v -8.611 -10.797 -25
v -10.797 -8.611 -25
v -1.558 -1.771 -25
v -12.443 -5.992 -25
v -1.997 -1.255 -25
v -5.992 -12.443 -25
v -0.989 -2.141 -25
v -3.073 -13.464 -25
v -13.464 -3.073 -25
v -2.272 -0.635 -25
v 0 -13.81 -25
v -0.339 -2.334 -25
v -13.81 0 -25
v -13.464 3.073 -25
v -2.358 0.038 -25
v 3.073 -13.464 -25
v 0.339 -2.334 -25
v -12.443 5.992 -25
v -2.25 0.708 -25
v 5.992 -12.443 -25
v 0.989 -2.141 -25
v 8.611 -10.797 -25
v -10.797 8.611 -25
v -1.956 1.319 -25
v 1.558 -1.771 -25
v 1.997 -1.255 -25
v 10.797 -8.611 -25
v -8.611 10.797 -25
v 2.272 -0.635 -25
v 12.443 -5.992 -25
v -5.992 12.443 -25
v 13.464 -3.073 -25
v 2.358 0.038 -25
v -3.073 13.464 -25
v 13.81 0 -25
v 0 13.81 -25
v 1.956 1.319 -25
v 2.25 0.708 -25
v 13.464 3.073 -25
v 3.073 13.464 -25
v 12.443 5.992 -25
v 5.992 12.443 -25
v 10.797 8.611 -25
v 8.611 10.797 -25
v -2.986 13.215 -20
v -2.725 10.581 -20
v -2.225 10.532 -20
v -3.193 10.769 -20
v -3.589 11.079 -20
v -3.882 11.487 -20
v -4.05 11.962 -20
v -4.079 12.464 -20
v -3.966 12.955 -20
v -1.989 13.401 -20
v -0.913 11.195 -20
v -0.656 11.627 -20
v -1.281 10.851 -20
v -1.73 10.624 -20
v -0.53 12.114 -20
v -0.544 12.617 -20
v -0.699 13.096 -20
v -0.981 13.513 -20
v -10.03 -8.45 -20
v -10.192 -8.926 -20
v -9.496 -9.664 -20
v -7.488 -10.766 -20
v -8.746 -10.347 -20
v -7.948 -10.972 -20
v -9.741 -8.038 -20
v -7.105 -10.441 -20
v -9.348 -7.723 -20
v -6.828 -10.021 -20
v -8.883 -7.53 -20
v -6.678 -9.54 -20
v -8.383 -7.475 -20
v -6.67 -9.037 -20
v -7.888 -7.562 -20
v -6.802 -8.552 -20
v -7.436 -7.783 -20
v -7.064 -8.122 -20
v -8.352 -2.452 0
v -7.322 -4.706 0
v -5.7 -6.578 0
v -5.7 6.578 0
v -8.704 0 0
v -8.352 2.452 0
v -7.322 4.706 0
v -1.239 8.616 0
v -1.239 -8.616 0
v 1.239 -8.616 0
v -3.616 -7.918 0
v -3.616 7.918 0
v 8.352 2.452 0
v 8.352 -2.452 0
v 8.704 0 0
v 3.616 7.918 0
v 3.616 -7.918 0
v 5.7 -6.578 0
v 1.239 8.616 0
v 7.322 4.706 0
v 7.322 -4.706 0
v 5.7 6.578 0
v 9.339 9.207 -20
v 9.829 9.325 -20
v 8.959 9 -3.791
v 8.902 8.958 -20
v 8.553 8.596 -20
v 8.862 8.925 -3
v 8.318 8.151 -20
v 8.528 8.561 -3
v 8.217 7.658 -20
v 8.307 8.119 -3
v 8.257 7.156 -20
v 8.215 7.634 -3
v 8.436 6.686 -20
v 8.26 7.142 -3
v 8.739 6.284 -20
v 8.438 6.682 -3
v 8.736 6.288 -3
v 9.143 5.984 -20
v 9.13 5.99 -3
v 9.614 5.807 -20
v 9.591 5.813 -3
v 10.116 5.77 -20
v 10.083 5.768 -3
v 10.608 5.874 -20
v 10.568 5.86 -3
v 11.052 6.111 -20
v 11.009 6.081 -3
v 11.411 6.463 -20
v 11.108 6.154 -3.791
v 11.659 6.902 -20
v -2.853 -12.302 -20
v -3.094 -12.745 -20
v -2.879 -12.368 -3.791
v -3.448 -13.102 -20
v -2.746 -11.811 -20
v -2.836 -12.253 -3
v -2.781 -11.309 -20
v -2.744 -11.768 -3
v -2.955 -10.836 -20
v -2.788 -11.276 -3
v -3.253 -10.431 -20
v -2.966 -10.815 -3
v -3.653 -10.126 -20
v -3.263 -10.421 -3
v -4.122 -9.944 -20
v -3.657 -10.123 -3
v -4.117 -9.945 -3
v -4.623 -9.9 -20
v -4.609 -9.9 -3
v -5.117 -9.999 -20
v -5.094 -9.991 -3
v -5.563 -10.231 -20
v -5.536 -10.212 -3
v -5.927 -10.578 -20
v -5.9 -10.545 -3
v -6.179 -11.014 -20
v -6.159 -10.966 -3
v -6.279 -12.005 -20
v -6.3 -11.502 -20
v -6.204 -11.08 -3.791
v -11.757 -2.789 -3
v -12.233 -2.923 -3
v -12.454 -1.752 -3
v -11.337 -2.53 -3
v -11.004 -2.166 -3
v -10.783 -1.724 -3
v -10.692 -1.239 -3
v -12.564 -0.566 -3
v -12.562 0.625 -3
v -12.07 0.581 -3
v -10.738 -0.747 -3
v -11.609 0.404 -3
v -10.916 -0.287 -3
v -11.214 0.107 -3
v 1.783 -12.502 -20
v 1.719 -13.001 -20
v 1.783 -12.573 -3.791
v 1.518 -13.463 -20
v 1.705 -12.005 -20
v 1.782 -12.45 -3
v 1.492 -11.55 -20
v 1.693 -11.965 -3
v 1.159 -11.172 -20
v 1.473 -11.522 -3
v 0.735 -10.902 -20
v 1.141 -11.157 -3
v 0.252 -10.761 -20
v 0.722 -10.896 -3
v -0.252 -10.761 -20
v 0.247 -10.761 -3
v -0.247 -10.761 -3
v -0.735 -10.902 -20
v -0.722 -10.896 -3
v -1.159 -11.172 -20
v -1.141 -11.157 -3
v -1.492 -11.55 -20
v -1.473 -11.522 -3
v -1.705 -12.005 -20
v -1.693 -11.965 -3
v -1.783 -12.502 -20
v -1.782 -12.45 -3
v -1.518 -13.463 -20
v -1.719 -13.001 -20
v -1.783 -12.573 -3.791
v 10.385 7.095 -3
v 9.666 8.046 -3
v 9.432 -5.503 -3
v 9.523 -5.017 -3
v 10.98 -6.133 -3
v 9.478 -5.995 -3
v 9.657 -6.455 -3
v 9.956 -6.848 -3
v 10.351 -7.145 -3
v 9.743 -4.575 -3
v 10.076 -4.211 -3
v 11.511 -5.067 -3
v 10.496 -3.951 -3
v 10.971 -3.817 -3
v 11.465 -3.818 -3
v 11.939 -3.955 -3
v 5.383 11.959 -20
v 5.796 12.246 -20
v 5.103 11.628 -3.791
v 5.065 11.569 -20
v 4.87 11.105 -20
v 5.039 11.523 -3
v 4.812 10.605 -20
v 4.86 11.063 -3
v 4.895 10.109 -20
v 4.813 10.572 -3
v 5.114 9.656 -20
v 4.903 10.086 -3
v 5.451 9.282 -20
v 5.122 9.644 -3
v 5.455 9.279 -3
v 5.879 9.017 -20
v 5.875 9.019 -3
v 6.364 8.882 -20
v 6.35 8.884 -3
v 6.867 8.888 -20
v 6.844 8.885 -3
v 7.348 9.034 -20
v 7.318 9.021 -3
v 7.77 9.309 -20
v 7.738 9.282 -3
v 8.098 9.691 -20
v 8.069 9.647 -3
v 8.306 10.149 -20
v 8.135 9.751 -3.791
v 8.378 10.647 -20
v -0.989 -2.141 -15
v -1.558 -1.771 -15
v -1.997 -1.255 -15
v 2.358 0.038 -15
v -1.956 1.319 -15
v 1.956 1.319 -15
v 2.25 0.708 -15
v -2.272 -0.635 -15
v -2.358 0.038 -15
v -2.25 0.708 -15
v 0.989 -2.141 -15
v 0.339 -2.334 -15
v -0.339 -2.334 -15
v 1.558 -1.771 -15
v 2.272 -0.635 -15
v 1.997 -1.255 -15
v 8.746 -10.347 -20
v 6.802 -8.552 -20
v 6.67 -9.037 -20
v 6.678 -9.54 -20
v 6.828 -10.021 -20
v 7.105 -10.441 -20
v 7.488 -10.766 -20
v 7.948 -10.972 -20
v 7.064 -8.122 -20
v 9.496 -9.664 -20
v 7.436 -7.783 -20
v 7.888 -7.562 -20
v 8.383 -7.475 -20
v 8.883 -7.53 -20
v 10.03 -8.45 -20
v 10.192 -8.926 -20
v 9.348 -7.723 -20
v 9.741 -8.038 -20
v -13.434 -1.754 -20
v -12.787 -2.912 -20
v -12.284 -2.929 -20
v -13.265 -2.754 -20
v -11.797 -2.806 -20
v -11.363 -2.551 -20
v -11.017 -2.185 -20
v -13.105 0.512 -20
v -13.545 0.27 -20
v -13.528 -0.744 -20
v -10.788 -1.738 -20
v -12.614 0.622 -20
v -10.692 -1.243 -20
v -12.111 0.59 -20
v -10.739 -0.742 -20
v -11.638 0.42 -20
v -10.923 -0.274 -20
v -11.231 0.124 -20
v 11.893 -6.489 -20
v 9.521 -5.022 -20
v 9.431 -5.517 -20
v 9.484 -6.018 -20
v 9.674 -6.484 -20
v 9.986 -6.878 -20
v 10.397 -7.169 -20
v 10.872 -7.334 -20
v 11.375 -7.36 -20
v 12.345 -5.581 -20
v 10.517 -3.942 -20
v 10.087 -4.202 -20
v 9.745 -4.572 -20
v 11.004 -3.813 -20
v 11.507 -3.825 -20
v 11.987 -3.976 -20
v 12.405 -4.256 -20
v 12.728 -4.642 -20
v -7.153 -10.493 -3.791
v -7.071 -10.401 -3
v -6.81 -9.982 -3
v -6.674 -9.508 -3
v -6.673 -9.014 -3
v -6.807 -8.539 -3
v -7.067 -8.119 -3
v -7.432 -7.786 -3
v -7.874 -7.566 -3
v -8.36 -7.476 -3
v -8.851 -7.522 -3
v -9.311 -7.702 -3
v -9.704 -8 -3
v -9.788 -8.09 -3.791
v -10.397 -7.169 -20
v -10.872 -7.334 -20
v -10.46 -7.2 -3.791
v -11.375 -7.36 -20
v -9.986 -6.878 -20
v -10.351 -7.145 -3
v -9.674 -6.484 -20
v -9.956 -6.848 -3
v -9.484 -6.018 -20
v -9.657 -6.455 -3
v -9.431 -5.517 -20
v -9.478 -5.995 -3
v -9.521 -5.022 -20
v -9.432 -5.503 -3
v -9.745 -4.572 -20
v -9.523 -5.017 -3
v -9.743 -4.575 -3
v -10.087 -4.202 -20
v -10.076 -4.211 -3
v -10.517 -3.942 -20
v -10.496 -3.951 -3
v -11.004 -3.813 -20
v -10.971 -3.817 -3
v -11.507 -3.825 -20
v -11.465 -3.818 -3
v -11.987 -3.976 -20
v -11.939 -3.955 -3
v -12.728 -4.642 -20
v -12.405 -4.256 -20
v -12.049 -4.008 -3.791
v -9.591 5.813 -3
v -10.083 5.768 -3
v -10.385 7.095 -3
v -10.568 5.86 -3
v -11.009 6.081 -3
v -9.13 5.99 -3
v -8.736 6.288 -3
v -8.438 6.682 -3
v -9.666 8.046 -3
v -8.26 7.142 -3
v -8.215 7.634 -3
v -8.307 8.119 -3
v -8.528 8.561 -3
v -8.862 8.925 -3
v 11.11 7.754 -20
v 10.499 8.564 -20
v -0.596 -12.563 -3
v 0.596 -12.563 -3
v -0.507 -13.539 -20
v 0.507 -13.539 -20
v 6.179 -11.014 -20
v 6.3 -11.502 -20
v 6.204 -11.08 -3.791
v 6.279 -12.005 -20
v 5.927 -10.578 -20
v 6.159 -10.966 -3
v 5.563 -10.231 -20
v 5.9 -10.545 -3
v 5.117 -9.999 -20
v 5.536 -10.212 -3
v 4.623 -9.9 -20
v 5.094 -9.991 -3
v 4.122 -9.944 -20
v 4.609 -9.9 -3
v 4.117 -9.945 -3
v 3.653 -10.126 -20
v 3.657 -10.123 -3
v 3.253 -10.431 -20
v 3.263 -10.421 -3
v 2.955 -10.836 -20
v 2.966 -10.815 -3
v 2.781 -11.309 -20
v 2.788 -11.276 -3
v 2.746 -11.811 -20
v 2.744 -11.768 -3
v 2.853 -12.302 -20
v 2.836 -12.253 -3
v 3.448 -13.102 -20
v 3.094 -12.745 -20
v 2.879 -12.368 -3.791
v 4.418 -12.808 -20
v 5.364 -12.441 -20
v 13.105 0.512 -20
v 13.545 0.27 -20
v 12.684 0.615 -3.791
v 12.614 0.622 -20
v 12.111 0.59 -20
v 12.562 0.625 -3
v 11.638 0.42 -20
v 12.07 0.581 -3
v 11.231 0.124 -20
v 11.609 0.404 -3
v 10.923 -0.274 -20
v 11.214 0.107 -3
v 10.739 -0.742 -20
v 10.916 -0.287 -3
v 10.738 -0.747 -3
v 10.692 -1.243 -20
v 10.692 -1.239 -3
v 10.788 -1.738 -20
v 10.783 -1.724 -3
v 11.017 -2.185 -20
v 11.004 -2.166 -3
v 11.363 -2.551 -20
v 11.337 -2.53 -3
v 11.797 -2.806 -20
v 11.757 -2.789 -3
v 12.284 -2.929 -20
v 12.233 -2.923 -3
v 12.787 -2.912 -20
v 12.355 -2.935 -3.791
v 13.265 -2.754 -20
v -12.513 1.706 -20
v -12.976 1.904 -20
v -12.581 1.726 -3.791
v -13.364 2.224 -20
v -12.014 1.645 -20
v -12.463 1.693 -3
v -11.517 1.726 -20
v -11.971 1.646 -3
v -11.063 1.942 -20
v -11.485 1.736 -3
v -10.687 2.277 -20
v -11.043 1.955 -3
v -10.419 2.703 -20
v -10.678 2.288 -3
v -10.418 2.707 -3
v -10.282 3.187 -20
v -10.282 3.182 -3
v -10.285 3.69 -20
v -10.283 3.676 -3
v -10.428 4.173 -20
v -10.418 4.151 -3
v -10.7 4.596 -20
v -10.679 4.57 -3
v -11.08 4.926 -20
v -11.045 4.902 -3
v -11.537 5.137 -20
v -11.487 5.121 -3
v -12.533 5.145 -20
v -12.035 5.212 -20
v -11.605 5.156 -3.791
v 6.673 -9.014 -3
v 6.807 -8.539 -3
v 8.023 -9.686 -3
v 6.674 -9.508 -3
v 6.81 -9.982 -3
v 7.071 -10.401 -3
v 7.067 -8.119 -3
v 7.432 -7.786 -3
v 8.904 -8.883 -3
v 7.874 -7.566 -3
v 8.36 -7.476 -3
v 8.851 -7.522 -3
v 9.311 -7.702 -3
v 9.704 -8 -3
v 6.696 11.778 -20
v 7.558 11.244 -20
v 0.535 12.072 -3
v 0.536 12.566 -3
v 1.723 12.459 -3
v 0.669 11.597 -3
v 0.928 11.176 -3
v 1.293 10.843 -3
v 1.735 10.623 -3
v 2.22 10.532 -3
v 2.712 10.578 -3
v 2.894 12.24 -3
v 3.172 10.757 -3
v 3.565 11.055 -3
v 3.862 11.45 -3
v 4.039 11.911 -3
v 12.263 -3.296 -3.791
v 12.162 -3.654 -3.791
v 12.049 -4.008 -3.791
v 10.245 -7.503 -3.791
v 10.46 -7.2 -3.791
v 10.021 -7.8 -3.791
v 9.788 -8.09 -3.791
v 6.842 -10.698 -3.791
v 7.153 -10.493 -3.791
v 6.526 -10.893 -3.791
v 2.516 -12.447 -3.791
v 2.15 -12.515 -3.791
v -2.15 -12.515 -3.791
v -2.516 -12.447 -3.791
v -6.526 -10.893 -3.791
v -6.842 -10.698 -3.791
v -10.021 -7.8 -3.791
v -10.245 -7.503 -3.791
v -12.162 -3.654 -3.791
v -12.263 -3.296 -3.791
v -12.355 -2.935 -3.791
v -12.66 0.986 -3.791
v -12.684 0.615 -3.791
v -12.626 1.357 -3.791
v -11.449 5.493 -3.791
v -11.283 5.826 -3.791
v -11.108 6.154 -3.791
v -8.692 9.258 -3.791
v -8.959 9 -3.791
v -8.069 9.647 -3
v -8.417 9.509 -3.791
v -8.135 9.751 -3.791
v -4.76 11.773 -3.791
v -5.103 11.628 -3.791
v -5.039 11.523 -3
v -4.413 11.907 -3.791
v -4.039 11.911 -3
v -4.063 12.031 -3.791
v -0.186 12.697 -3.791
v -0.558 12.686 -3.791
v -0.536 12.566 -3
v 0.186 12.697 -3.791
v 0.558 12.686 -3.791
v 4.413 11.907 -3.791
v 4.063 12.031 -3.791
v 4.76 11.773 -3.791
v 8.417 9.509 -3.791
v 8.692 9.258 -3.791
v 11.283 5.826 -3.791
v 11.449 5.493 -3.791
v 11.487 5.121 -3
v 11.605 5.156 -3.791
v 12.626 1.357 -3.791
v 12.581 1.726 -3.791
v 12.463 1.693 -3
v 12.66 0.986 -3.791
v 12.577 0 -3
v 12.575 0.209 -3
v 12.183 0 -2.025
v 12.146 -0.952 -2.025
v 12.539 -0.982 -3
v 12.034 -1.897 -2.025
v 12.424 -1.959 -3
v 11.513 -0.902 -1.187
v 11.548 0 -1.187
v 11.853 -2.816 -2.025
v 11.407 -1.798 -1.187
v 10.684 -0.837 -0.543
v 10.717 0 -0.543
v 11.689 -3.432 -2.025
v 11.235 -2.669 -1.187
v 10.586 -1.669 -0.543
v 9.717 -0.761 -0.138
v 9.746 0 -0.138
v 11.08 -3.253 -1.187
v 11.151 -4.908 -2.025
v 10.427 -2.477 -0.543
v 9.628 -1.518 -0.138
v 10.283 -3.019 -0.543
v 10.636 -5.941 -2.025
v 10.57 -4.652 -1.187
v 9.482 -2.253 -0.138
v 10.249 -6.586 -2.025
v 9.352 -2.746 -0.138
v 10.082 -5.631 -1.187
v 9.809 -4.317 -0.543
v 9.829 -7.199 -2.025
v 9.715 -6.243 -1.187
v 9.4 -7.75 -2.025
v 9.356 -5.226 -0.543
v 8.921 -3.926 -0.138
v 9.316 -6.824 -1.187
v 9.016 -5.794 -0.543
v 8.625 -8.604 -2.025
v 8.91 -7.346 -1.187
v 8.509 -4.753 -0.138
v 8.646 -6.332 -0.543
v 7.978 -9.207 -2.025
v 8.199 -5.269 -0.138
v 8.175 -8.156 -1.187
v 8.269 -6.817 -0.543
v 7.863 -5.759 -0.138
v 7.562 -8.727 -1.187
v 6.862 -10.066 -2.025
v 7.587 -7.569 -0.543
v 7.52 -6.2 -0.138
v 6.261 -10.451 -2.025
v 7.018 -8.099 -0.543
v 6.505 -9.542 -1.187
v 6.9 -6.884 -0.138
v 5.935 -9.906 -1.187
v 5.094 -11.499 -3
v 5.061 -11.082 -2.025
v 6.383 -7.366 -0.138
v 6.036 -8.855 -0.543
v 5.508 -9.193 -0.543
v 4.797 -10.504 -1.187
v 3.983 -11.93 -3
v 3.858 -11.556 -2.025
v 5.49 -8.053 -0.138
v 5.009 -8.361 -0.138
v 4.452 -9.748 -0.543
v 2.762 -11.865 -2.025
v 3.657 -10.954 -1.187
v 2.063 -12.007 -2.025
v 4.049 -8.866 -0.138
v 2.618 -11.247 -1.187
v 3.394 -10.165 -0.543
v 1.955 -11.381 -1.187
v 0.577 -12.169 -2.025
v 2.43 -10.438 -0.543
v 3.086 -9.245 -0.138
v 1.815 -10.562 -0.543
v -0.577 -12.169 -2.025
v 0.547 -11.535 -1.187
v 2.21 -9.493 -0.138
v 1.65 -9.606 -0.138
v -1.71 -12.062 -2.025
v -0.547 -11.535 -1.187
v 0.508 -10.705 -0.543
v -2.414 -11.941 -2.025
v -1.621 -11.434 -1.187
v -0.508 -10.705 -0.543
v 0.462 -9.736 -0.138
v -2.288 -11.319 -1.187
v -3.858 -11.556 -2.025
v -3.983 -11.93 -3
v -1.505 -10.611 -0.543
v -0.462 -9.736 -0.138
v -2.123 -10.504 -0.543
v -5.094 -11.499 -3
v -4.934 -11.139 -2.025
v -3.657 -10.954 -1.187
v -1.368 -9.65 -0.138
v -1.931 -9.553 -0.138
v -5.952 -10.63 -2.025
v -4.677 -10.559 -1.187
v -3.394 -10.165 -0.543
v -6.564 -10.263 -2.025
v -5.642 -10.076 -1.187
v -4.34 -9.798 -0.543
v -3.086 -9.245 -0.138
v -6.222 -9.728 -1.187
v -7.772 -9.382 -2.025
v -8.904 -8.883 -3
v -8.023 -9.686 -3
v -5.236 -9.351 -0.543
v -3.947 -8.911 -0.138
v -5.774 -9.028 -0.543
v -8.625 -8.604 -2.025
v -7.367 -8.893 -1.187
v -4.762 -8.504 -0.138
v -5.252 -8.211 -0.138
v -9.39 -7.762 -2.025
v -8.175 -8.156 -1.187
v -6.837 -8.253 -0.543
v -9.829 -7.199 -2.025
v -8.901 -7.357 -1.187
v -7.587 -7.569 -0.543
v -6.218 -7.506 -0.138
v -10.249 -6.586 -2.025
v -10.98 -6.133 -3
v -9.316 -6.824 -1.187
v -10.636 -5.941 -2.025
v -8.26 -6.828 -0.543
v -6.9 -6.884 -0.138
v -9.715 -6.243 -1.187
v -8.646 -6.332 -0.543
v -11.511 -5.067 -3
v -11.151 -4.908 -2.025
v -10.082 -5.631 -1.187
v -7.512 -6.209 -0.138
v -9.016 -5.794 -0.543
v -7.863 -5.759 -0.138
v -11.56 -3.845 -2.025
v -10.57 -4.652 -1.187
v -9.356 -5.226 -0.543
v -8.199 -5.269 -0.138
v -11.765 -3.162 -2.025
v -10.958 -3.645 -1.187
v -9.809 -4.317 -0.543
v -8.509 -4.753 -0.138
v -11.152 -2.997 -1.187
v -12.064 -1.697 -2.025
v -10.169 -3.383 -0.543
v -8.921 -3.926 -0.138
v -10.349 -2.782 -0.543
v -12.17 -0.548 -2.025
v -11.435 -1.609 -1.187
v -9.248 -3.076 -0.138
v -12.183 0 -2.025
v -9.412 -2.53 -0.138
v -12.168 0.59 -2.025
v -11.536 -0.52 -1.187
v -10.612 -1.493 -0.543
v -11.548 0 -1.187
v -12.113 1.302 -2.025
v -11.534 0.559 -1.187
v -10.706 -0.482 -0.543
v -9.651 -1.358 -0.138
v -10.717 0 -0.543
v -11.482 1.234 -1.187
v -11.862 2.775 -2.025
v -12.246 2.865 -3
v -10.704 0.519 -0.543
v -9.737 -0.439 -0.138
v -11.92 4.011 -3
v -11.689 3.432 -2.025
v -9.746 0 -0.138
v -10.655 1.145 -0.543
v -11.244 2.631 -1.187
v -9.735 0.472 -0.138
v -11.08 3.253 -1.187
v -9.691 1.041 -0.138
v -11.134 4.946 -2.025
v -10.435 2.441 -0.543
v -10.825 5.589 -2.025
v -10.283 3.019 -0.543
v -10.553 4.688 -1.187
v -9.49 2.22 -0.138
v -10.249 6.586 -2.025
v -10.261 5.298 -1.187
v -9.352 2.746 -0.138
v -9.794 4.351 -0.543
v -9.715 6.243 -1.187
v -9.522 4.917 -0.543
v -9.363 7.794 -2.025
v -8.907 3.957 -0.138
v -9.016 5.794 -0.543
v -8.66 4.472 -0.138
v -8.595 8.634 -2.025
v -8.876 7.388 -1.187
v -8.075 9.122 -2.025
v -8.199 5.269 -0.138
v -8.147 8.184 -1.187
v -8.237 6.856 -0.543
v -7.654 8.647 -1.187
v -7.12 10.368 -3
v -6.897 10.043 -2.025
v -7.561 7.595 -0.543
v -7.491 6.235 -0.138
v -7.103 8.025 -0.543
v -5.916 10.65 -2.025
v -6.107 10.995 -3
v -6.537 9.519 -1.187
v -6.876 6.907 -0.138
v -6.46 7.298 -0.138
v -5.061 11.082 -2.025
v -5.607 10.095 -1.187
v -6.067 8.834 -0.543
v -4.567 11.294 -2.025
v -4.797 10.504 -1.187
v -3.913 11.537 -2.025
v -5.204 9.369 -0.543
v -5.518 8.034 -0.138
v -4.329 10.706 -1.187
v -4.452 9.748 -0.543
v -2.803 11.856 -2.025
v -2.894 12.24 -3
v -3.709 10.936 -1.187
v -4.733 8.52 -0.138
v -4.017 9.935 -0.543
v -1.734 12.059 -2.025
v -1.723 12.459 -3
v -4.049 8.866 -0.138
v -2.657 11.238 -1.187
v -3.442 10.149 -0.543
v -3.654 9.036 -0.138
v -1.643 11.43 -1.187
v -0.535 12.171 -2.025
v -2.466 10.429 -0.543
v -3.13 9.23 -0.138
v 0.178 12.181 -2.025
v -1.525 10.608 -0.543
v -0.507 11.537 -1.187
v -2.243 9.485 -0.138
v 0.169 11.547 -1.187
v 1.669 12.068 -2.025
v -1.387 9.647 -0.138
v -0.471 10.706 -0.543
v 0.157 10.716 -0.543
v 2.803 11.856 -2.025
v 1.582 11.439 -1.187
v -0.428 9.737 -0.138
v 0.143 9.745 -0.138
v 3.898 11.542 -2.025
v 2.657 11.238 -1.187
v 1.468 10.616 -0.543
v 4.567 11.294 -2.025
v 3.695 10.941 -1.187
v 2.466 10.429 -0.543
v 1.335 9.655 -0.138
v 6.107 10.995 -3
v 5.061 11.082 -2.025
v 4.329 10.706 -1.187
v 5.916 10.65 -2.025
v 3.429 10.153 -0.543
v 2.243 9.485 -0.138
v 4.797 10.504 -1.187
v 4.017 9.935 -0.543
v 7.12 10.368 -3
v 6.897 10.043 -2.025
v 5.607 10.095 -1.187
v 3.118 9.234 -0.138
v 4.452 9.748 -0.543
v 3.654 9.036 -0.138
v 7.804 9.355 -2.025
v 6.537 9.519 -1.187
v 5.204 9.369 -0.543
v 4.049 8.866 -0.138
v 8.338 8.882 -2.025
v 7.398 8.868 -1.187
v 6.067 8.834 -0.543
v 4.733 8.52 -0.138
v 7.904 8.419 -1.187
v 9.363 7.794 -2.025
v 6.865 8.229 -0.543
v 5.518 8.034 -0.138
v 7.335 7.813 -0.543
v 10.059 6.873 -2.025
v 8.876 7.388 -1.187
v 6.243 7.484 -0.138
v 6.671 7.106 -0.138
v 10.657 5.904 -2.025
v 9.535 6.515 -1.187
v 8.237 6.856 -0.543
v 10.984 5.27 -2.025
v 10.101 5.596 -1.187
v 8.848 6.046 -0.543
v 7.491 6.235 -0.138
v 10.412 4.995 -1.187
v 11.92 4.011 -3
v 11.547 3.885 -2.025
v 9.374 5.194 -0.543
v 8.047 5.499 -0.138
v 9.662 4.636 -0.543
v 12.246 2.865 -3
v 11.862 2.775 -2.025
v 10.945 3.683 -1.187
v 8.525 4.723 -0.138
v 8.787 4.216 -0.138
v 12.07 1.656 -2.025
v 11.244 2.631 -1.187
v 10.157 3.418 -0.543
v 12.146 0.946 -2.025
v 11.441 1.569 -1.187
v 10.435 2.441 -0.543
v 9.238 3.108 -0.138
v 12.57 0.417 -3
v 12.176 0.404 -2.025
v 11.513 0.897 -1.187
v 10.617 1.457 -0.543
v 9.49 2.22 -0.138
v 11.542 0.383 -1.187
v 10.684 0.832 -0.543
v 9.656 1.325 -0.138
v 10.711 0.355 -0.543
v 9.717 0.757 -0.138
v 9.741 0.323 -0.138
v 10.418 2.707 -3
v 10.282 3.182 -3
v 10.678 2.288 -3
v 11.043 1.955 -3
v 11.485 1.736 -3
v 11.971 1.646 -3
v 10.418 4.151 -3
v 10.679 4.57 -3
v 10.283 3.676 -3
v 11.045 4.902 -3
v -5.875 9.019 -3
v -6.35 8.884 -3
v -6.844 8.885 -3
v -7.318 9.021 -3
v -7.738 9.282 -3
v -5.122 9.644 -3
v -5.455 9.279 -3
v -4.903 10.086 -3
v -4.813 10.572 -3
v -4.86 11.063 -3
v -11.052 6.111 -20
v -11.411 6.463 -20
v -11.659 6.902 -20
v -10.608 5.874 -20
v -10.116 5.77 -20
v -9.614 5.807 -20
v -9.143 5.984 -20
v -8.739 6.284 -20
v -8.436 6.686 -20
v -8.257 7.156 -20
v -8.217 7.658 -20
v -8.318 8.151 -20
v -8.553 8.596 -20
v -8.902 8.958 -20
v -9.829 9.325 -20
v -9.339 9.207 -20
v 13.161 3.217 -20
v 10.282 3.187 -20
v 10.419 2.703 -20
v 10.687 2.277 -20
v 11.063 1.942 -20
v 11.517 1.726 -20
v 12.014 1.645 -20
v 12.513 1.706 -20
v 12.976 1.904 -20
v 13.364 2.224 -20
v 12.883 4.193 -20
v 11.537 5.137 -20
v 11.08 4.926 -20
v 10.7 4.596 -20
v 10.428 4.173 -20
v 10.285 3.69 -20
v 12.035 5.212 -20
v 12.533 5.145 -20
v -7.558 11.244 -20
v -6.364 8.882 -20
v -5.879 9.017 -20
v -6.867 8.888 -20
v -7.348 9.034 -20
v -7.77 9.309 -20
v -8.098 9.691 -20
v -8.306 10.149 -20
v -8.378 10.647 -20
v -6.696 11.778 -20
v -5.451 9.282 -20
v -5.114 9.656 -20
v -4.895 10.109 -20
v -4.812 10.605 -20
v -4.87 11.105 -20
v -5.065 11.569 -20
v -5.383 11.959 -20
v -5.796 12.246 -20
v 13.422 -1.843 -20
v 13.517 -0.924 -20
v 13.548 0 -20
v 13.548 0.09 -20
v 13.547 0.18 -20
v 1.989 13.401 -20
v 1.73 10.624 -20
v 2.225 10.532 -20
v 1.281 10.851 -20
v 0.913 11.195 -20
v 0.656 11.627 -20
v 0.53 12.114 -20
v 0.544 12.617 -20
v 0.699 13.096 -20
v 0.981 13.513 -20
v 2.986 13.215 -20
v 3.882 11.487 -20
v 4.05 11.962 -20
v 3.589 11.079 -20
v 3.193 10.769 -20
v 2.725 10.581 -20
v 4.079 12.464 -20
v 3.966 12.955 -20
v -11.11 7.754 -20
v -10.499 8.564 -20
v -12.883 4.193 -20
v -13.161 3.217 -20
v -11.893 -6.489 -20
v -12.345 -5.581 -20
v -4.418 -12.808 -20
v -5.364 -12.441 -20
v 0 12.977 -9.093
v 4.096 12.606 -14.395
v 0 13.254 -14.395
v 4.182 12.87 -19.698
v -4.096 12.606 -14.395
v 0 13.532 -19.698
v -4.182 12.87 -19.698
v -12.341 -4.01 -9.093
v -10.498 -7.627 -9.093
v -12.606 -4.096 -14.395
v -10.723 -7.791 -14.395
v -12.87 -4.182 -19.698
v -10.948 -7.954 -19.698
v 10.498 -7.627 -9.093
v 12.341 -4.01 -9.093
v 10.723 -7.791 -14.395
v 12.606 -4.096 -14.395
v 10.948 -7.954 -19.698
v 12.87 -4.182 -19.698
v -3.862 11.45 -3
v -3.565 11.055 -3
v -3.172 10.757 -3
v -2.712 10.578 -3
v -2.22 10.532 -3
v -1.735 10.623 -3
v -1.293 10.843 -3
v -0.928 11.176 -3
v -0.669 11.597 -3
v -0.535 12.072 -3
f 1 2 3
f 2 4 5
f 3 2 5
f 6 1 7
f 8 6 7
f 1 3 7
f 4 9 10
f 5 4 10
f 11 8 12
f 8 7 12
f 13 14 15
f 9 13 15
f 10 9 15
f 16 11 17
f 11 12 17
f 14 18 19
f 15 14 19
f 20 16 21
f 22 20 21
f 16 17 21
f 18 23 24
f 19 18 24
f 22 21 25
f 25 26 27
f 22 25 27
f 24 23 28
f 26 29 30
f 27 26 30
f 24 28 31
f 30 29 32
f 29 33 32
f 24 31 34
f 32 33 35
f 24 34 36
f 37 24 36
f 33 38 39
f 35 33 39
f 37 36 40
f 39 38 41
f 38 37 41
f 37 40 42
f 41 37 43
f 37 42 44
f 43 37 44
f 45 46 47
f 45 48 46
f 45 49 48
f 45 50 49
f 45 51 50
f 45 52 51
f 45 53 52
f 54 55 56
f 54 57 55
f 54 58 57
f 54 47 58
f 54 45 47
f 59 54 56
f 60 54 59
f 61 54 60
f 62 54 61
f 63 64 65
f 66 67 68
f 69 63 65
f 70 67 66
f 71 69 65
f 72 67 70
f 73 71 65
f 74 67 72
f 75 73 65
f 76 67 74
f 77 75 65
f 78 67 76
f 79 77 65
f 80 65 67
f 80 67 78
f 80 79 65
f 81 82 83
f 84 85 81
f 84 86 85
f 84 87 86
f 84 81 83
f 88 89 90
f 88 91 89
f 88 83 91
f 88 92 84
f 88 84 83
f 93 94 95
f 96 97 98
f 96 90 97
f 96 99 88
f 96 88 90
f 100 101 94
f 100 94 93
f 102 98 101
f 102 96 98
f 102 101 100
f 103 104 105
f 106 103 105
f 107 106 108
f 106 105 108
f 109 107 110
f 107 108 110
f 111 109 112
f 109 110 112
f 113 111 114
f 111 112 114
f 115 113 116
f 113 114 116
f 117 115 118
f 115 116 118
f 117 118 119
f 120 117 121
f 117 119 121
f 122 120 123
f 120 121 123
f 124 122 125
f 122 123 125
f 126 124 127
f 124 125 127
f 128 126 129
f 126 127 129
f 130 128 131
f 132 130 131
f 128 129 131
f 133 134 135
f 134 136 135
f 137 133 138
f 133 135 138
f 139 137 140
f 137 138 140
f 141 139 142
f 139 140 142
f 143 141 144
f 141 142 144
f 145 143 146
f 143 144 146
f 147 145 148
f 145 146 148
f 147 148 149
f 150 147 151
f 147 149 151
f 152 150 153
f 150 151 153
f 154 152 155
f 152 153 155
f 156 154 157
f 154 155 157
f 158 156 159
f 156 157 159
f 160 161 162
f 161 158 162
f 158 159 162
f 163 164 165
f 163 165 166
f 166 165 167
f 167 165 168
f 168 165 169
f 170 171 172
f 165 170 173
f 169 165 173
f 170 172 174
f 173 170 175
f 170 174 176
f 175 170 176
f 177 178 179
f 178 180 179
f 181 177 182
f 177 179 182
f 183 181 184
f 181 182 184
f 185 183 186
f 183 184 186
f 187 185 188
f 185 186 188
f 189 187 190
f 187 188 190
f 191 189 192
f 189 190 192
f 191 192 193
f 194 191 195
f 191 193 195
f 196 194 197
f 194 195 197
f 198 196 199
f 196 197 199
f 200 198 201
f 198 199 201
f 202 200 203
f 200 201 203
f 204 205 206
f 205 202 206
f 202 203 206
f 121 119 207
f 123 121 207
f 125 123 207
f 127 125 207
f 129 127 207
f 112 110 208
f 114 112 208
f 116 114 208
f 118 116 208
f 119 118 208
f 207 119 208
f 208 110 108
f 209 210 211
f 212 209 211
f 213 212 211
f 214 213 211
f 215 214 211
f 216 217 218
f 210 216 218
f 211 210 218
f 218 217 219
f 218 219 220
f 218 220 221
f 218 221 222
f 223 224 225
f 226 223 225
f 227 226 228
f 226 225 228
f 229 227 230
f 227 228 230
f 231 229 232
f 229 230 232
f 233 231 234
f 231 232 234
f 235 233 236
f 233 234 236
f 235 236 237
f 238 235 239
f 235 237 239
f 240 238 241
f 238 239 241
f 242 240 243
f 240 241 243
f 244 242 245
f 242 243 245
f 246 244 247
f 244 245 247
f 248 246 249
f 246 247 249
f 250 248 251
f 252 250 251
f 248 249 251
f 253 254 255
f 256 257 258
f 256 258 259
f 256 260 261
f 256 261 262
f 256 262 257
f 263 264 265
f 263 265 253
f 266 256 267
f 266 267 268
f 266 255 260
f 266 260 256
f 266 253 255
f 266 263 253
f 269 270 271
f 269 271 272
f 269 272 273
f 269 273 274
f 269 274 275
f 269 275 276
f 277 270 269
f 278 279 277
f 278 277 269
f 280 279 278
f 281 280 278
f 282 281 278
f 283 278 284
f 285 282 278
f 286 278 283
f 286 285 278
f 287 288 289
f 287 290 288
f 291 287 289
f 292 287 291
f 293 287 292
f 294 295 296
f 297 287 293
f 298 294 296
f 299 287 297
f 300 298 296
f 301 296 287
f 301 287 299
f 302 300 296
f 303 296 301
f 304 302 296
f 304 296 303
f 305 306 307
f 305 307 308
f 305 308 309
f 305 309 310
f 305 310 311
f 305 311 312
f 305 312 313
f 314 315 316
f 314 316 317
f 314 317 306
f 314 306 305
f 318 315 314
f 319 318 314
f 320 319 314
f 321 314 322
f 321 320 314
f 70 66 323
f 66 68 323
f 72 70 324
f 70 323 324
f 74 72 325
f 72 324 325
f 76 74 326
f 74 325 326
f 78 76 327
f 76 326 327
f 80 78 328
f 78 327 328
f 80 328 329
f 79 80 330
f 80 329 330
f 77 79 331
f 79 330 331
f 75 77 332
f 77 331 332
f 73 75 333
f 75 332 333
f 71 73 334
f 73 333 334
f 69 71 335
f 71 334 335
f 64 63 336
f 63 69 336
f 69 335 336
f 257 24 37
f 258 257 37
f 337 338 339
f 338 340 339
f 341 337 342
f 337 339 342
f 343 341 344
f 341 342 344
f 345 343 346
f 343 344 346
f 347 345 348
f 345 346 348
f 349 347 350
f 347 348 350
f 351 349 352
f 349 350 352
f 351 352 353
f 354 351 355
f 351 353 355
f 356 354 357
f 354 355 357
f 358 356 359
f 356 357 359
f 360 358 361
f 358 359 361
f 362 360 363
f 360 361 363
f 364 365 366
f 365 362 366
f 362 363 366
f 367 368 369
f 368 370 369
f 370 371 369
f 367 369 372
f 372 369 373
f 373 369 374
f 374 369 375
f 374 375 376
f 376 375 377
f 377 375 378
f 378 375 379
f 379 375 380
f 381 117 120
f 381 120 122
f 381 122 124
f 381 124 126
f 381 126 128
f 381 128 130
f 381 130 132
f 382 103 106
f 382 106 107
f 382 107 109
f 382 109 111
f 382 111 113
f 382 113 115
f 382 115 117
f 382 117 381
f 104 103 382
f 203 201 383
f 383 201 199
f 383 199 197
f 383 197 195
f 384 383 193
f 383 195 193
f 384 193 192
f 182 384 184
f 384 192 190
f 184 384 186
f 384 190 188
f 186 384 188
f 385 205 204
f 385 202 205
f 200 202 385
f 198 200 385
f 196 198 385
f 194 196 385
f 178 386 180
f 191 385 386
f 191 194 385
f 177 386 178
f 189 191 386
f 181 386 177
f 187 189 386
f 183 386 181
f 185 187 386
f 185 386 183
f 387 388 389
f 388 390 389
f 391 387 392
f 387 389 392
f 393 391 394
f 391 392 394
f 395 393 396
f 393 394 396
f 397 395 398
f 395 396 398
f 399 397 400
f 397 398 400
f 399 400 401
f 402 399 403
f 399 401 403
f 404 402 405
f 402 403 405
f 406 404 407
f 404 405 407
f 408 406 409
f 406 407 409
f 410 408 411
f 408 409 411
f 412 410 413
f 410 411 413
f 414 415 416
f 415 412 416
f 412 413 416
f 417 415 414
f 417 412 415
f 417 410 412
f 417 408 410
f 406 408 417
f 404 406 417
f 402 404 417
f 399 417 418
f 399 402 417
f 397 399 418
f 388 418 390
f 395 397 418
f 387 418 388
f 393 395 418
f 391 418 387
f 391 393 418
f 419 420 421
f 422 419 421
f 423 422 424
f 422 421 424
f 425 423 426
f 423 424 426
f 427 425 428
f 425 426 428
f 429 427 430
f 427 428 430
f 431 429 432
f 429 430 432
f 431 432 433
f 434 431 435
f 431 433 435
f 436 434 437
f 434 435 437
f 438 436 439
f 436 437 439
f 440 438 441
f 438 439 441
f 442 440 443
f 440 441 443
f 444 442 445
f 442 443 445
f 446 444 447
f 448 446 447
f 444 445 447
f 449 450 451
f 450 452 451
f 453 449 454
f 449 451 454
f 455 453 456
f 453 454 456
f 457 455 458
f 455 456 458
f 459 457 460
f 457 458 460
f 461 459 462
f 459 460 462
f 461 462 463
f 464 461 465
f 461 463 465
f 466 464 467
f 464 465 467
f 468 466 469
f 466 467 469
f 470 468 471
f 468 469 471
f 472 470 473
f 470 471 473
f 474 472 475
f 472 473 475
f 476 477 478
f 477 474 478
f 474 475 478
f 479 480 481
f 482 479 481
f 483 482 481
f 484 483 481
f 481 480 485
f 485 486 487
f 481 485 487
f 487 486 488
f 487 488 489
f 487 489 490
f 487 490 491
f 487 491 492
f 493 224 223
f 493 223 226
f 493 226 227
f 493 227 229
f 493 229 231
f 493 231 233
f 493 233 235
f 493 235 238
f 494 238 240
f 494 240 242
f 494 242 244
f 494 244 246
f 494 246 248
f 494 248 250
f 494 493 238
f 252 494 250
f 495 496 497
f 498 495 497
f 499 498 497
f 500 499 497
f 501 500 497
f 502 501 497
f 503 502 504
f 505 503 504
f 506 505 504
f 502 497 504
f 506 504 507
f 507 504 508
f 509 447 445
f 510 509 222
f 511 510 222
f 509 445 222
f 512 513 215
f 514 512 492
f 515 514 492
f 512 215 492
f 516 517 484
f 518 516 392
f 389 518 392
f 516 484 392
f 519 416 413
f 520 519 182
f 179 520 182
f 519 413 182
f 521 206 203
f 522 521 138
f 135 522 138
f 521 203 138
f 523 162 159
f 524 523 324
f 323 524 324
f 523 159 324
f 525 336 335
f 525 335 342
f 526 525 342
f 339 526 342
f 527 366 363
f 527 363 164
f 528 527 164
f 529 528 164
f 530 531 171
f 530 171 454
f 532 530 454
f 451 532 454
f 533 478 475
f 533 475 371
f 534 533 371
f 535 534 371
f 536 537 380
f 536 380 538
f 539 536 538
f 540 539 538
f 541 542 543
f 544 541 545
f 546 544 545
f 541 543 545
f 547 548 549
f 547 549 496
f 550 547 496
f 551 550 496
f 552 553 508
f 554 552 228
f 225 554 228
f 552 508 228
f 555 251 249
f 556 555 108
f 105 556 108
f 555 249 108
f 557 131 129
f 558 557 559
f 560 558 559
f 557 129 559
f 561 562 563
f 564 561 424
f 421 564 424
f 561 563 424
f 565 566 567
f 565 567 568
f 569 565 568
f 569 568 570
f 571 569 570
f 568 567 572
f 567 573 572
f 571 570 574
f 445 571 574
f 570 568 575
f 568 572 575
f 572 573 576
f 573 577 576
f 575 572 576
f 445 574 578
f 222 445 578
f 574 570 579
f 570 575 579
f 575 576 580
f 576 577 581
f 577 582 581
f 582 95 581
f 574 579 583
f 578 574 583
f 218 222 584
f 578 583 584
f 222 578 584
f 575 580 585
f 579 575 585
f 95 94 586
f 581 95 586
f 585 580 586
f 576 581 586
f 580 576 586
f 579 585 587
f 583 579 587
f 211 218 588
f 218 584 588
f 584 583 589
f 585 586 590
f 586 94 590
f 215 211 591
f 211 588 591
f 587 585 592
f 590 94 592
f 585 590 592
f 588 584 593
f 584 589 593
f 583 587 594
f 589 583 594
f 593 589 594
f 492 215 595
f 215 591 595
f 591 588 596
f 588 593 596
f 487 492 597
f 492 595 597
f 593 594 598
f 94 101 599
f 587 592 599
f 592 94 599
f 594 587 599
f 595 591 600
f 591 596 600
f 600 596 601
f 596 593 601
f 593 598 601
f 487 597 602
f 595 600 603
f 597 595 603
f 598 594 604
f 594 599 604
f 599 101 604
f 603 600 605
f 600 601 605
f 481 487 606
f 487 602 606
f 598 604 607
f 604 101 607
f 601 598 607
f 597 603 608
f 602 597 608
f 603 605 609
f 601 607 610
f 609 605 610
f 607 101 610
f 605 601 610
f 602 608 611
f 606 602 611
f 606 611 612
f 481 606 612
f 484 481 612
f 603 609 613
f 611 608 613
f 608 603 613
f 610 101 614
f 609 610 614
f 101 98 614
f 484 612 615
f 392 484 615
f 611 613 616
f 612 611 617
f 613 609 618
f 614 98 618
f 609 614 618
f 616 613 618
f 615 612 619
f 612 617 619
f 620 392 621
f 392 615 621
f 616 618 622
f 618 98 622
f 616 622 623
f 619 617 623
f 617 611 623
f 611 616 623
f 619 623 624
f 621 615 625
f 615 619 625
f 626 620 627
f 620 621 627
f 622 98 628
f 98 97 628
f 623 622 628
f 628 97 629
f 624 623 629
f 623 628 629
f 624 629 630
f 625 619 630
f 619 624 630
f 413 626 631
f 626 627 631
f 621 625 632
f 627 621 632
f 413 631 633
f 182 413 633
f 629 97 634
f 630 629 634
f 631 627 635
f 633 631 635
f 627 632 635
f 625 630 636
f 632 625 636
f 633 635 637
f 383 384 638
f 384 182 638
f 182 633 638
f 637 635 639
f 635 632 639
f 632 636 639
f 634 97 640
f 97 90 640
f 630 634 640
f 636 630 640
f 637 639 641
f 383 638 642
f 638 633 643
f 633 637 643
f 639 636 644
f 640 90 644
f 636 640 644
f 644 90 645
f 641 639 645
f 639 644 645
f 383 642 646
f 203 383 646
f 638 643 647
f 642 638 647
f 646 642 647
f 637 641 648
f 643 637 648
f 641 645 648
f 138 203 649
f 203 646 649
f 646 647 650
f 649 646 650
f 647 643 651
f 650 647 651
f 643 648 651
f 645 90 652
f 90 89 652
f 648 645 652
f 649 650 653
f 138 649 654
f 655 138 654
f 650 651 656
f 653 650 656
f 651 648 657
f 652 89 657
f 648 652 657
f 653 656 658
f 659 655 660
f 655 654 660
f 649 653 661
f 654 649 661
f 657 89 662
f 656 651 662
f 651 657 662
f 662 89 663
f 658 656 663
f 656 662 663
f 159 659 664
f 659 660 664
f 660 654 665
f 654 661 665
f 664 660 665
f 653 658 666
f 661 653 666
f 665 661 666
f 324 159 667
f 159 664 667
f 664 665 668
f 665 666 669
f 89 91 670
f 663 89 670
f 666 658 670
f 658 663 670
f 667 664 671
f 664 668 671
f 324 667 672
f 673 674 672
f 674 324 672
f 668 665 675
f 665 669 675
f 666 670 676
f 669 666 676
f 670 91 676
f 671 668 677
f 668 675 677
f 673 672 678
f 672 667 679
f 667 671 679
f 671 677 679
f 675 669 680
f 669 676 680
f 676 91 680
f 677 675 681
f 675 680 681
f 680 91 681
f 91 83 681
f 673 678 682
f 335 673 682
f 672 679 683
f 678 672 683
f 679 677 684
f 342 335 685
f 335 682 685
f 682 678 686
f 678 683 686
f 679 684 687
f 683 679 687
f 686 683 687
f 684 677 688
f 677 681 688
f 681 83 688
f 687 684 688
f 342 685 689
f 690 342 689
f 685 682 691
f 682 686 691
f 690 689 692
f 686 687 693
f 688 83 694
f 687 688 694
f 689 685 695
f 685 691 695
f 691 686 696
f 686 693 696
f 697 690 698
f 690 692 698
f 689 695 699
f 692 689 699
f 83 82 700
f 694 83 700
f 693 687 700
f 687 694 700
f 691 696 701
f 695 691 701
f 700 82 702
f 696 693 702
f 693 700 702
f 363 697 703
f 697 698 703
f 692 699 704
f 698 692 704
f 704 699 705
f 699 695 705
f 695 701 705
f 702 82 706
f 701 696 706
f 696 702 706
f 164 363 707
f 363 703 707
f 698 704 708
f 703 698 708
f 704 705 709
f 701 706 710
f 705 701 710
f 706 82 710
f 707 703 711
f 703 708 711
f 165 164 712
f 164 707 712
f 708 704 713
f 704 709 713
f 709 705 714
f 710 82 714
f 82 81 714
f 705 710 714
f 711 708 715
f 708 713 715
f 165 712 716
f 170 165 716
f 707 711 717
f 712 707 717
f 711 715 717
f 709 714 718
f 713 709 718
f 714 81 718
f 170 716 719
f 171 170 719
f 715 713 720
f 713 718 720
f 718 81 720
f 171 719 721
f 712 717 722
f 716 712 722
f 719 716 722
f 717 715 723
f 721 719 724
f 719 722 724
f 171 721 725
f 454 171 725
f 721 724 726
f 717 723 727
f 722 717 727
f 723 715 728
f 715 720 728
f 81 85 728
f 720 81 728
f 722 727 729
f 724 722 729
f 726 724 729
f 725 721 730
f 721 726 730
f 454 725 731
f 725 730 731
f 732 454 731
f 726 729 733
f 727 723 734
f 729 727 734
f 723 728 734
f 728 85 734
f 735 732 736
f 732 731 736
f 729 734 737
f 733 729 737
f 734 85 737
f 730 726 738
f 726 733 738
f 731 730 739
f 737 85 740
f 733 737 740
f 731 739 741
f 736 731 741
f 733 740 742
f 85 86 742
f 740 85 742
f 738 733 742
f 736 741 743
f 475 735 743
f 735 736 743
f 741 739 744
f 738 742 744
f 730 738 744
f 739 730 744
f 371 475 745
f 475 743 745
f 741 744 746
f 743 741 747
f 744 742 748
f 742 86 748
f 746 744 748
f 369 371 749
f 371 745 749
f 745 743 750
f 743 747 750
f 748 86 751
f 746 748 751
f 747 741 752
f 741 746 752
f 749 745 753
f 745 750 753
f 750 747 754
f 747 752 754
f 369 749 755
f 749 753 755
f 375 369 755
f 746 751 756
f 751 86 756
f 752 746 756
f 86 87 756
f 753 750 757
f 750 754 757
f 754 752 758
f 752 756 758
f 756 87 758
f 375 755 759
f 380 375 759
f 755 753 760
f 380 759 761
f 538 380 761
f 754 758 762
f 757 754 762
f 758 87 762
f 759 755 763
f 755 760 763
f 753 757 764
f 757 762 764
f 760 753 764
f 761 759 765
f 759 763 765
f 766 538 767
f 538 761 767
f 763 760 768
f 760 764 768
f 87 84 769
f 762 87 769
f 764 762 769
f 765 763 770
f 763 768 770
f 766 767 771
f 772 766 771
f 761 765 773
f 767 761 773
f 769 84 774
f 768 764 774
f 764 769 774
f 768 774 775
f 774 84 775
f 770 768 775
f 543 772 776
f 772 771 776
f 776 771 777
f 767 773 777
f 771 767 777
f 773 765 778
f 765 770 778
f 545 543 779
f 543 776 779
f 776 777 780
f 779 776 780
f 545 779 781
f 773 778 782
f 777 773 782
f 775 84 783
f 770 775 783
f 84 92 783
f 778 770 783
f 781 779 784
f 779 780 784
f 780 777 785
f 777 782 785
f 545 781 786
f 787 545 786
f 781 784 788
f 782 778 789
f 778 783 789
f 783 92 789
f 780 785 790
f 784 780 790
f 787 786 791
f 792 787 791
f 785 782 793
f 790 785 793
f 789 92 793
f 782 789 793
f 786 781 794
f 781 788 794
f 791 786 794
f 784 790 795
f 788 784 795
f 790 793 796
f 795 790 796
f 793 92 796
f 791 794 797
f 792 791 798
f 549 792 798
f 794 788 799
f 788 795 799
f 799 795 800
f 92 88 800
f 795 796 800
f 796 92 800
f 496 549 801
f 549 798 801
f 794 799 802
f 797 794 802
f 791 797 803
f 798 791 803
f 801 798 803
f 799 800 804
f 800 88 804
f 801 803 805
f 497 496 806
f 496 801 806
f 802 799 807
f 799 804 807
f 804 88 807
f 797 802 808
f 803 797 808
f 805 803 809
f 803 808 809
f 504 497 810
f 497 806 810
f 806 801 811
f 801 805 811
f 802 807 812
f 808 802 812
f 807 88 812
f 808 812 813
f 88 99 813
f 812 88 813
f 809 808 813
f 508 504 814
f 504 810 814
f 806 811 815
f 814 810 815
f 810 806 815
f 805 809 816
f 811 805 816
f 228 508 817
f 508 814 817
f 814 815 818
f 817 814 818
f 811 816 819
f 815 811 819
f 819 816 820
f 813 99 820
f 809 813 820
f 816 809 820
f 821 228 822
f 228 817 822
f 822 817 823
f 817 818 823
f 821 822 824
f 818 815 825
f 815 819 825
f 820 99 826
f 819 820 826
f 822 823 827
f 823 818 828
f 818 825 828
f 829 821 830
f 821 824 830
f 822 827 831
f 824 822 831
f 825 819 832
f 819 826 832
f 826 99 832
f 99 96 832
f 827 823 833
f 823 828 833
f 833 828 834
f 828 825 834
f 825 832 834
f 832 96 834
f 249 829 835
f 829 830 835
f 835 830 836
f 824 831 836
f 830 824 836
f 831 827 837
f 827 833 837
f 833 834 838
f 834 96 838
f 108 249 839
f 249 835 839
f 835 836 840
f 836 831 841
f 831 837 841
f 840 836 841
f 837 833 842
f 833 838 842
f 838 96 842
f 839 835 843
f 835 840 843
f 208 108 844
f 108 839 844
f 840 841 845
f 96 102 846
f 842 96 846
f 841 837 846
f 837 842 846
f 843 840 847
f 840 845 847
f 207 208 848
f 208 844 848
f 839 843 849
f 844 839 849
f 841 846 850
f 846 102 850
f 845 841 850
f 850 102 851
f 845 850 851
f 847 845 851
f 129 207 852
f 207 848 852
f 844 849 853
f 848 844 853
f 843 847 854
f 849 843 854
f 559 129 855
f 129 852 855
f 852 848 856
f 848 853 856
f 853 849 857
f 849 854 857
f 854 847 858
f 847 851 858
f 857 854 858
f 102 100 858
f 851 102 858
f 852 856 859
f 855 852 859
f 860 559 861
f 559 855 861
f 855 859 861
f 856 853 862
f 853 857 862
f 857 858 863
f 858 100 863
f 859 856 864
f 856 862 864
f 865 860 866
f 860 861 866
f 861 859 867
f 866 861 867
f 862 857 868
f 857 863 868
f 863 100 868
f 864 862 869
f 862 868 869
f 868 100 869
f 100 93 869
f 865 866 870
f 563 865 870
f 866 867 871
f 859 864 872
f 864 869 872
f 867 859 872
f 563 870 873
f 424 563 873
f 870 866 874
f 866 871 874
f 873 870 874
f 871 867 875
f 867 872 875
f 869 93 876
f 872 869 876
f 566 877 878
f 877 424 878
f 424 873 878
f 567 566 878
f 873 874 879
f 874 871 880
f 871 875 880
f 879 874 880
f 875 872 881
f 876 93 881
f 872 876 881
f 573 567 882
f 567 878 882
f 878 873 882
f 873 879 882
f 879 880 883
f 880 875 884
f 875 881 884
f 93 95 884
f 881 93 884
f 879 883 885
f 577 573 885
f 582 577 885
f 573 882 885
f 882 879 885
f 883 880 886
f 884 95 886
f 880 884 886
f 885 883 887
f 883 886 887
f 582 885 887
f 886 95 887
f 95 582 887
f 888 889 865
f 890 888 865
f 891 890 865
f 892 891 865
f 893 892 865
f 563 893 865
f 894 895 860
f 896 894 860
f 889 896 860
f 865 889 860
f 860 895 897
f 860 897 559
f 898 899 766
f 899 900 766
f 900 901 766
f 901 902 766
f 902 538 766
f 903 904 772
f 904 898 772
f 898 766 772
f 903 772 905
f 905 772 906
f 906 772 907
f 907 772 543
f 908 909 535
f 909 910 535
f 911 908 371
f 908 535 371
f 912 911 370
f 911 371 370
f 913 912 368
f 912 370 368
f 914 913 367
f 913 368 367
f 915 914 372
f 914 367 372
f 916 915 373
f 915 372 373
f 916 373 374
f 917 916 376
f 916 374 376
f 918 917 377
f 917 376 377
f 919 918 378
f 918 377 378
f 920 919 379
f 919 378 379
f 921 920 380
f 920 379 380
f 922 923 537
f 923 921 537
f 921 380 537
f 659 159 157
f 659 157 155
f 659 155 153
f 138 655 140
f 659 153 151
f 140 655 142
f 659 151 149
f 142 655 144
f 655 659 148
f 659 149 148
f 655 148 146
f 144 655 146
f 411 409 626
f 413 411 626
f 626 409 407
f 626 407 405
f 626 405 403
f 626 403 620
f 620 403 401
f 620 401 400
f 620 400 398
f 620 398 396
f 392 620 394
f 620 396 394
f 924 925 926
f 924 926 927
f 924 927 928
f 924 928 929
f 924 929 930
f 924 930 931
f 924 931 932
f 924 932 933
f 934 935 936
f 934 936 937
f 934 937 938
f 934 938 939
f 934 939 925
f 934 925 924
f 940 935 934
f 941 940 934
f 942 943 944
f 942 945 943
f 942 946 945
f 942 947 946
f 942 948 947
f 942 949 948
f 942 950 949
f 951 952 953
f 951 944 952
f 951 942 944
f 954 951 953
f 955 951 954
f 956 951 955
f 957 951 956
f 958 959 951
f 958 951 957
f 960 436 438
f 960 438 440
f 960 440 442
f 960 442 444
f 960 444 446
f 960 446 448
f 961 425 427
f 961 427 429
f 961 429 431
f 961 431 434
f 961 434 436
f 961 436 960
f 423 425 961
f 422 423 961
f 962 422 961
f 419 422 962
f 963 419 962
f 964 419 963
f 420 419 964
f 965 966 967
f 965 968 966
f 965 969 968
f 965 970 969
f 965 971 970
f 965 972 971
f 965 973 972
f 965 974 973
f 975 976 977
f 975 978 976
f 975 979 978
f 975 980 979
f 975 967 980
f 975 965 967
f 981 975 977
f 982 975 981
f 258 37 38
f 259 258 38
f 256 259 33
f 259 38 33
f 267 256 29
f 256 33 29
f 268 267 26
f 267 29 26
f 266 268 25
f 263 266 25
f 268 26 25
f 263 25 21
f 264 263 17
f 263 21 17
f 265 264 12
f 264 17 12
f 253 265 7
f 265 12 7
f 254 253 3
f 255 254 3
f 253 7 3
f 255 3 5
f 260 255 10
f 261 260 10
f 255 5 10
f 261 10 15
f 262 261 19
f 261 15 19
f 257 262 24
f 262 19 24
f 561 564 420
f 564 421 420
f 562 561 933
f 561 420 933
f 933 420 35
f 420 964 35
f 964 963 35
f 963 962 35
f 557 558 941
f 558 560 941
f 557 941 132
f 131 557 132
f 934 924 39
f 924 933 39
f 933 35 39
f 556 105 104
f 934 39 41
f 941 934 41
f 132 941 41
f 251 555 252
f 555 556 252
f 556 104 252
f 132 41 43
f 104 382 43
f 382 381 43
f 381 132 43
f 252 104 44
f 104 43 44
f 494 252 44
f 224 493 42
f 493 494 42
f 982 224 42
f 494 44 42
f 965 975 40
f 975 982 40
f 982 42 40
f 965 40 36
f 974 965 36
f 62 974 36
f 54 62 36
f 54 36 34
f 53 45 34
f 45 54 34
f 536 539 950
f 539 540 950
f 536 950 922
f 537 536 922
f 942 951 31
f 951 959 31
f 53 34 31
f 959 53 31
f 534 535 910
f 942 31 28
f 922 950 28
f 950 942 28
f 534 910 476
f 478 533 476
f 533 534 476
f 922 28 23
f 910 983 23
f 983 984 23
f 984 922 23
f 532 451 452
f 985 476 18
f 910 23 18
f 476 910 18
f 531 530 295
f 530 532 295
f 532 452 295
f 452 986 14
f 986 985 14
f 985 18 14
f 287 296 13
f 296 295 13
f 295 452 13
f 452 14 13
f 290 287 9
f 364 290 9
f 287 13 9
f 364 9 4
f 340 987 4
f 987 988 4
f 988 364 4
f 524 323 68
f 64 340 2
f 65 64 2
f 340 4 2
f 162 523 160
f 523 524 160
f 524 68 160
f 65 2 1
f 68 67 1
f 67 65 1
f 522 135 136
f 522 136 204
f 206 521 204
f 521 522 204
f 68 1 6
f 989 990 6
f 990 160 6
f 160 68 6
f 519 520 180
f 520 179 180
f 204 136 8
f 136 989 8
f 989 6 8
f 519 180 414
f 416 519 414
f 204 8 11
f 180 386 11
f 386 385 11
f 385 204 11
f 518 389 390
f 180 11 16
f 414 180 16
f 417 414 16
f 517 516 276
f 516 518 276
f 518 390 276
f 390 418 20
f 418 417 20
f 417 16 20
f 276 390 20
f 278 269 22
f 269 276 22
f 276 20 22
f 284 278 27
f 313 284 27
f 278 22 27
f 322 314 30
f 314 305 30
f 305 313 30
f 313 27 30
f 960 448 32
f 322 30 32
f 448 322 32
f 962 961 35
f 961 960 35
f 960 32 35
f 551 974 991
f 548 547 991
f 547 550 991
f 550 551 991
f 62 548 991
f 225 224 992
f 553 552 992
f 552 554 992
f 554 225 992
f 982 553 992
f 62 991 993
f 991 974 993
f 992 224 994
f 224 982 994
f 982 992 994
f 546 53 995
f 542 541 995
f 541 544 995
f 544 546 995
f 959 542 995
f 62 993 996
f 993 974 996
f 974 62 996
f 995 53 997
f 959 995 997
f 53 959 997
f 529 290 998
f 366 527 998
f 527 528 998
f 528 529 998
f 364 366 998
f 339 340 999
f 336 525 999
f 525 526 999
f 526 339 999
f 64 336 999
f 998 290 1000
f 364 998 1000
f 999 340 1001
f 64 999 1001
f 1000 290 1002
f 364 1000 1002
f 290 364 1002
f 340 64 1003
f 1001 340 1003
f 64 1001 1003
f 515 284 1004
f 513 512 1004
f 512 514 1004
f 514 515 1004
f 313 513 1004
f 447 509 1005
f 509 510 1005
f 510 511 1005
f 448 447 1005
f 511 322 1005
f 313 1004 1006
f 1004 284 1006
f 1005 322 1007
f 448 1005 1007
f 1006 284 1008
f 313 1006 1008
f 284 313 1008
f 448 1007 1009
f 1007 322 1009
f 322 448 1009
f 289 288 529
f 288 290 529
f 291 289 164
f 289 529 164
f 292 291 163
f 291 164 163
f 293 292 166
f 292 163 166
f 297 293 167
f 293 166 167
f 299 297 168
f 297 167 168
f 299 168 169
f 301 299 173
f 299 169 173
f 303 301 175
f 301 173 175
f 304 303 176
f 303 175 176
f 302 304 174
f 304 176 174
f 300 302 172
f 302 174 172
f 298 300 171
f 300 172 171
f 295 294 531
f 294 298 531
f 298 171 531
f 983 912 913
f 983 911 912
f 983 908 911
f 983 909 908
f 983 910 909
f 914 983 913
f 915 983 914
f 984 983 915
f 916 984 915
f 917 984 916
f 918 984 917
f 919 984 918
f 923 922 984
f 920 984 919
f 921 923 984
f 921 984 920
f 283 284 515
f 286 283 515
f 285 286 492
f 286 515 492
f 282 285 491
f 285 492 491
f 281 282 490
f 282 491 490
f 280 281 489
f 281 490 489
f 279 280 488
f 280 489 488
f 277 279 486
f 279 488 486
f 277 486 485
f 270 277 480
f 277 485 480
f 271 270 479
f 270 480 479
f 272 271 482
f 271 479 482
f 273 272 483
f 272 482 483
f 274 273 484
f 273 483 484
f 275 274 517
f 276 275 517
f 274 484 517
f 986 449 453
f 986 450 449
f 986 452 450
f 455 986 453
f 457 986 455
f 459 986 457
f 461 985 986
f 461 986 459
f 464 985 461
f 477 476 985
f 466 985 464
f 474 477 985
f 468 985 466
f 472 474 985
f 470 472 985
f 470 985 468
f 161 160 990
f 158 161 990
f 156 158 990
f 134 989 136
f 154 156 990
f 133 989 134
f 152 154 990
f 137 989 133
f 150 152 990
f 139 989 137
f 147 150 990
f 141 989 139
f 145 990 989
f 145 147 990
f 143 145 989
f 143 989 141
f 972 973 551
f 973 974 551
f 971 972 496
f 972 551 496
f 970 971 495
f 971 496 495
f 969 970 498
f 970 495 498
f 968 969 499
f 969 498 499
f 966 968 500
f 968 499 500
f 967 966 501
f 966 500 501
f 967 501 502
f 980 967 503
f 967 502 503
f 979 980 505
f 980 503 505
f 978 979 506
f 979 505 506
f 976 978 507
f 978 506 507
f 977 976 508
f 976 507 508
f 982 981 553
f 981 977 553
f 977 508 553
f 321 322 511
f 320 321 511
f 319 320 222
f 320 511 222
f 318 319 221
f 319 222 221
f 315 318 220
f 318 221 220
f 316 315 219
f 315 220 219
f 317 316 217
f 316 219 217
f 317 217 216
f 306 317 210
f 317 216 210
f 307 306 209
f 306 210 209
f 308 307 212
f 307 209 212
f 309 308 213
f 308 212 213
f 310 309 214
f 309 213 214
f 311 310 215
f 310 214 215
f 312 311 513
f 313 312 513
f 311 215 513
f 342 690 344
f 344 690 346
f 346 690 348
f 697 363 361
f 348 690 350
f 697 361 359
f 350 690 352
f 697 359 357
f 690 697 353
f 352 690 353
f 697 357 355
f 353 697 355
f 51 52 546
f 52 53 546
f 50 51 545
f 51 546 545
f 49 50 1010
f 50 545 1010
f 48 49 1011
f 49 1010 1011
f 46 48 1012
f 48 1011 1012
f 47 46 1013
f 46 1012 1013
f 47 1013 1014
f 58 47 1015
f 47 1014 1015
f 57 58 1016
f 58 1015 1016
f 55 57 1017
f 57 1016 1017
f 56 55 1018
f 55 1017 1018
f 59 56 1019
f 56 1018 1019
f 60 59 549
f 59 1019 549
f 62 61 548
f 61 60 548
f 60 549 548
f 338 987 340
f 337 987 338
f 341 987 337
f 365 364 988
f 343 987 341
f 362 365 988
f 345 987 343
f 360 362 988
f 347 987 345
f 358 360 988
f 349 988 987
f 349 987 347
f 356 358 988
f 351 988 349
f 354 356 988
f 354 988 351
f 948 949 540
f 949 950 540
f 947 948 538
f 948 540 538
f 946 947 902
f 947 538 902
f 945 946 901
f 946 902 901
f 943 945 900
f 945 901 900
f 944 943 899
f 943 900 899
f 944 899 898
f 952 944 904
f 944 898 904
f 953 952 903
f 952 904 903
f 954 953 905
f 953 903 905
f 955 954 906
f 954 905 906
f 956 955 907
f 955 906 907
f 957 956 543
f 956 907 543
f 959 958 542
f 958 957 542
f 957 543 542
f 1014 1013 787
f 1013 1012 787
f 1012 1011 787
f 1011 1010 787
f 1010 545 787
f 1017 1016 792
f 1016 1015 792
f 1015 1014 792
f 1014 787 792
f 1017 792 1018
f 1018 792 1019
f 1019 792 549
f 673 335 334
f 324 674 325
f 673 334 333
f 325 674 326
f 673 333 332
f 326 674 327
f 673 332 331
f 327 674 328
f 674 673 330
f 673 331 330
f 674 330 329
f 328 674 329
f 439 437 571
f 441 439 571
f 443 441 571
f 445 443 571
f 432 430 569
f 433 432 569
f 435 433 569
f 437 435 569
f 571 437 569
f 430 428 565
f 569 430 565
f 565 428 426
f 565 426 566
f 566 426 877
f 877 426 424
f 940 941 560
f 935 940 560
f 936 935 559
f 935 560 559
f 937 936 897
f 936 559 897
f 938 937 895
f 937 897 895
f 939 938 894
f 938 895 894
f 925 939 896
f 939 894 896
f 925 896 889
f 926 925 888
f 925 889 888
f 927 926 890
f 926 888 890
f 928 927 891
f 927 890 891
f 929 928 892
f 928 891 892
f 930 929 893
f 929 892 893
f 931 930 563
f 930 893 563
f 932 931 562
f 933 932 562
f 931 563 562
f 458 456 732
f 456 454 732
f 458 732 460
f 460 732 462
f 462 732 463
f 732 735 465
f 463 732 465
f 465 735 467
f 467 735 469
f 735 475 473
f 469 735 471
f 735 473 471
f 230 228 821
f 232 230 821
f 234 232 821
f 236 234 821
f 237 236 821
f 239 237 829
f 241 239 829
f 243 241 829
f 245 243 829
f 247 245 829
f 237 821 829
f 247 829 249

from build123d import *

# Parameters (mm, degrees)
F1_R     = 12.5
F2_DEPTH = 25
F2_TAPER = -3
F3_R     = 1.7835138624
F4_DEPTH = 17
F7_DEPTH = 10


# Not quite as in the source:
# - a fillet or chamfer that OpenCascade refuses, or shapes differently, is made with other operations: its cross-section is extruded or revolved along the edge and cut away or added


with BuildPart() as f2:
    # F1 (on Top) → F2 (new body)
    with BuildSketch(Plane.XY):
        Circle(F1_R)
    extrude(amount=-F2_DEPTH, taper=F2_TAPER)

    # F3 (on offset) → F4 (cut)
    with BuildSketch(Plane.XY.offset(-3)):
        with Locations((0, -12.5270644203)):
            Circle(F3_R)
        with Locations((4.5252976236, -11.6811396879)):
            Circle(F3_R)
        with Locations((8.4394287276, -9.2576123132)):
            Circle(F3_R)
        with Locations((11.2137682175, -5.5837930974)):
            Circle(F3_R)
        with Locations((12.4736261719, -1.155851683)):
            Circle(F3_R)
        with Locations((12.0488517931, 3.4281939061)):
            Circle(F3_R)
        with Locations((9.9968132146, 7.5492429118)):
            Circle(F3_R)
        with Locations((6.5946496173, 10.6507248305)):
            Circle(F3_R)
        with Locations((2.3018420469, 12.3137673431)):
            Circle(F3_R)
        with Locations((-2.3018420469, 12.3137673431)):
            Circle(F3_R)
        with Locations((-6.5946496173, 10.6507248305)):
            Circle(F3_R)
        with Locations((-9.9968132146, 7.5492429118)):
            Circle(F3_R)
        with Locations((-12.0488517931, 3.4281939061)):
            Circle(F3_R)
        with Locations((-12.4736261719, -1.155851683)):
            Circle(F3_R)
        with Locations((-11.2137682175, -5.5837930974)):
            Circle(F3_R)
        with Locations((-8.4394287276, -9.2576123132)):
            Circle(F3_R)
        with Locations((-4.5252976236, -11.6811396879)):
            Circle(F3_R)
    extrude(amount=-F4_DEPTH, mode=Mode.SUBTRACT)

    # F5: fillet of radius 4 on 1 edges, made by hand

    # F5_s1 → F5_t2 (revolve, cut)
    with BuildSketch(Plane.XZ):
        with BuildLine():
            ThreePointArc((12.6986598722, -3.790656175), (11.4575600359, -1.098502516), (8.7041417331, 0))
            Line((8.7041417331, 0), (12.5, 0))
            Line((12.5, 0), (12.6986598722, -3.790656175))
        make_face()
    revolve(axis=Axis((0, 0, 0), (0, 0, -1)), mode=Mode.SUBTRACT)

    # F6 (on face) → F7 (cut)
    with BuildSketch(Plane(origin=(0, 0, -25), x_dir=(1, 0, 0), z_dir=(0, 0, -1))):
        with BuildLine():
            Line((-1.9557109083, -1.3185451265), (1.9557109083, -1.3185451265))
            ThreePointArc((1.9557109083, -1.3185451265), (0, 2.3586789539), (-1.9557109083, -1.3185451265))
        make_face()
    extrude(amount=-F7_DEPTH, mode=Mode.SUBTRACT)


solid = f2.part
